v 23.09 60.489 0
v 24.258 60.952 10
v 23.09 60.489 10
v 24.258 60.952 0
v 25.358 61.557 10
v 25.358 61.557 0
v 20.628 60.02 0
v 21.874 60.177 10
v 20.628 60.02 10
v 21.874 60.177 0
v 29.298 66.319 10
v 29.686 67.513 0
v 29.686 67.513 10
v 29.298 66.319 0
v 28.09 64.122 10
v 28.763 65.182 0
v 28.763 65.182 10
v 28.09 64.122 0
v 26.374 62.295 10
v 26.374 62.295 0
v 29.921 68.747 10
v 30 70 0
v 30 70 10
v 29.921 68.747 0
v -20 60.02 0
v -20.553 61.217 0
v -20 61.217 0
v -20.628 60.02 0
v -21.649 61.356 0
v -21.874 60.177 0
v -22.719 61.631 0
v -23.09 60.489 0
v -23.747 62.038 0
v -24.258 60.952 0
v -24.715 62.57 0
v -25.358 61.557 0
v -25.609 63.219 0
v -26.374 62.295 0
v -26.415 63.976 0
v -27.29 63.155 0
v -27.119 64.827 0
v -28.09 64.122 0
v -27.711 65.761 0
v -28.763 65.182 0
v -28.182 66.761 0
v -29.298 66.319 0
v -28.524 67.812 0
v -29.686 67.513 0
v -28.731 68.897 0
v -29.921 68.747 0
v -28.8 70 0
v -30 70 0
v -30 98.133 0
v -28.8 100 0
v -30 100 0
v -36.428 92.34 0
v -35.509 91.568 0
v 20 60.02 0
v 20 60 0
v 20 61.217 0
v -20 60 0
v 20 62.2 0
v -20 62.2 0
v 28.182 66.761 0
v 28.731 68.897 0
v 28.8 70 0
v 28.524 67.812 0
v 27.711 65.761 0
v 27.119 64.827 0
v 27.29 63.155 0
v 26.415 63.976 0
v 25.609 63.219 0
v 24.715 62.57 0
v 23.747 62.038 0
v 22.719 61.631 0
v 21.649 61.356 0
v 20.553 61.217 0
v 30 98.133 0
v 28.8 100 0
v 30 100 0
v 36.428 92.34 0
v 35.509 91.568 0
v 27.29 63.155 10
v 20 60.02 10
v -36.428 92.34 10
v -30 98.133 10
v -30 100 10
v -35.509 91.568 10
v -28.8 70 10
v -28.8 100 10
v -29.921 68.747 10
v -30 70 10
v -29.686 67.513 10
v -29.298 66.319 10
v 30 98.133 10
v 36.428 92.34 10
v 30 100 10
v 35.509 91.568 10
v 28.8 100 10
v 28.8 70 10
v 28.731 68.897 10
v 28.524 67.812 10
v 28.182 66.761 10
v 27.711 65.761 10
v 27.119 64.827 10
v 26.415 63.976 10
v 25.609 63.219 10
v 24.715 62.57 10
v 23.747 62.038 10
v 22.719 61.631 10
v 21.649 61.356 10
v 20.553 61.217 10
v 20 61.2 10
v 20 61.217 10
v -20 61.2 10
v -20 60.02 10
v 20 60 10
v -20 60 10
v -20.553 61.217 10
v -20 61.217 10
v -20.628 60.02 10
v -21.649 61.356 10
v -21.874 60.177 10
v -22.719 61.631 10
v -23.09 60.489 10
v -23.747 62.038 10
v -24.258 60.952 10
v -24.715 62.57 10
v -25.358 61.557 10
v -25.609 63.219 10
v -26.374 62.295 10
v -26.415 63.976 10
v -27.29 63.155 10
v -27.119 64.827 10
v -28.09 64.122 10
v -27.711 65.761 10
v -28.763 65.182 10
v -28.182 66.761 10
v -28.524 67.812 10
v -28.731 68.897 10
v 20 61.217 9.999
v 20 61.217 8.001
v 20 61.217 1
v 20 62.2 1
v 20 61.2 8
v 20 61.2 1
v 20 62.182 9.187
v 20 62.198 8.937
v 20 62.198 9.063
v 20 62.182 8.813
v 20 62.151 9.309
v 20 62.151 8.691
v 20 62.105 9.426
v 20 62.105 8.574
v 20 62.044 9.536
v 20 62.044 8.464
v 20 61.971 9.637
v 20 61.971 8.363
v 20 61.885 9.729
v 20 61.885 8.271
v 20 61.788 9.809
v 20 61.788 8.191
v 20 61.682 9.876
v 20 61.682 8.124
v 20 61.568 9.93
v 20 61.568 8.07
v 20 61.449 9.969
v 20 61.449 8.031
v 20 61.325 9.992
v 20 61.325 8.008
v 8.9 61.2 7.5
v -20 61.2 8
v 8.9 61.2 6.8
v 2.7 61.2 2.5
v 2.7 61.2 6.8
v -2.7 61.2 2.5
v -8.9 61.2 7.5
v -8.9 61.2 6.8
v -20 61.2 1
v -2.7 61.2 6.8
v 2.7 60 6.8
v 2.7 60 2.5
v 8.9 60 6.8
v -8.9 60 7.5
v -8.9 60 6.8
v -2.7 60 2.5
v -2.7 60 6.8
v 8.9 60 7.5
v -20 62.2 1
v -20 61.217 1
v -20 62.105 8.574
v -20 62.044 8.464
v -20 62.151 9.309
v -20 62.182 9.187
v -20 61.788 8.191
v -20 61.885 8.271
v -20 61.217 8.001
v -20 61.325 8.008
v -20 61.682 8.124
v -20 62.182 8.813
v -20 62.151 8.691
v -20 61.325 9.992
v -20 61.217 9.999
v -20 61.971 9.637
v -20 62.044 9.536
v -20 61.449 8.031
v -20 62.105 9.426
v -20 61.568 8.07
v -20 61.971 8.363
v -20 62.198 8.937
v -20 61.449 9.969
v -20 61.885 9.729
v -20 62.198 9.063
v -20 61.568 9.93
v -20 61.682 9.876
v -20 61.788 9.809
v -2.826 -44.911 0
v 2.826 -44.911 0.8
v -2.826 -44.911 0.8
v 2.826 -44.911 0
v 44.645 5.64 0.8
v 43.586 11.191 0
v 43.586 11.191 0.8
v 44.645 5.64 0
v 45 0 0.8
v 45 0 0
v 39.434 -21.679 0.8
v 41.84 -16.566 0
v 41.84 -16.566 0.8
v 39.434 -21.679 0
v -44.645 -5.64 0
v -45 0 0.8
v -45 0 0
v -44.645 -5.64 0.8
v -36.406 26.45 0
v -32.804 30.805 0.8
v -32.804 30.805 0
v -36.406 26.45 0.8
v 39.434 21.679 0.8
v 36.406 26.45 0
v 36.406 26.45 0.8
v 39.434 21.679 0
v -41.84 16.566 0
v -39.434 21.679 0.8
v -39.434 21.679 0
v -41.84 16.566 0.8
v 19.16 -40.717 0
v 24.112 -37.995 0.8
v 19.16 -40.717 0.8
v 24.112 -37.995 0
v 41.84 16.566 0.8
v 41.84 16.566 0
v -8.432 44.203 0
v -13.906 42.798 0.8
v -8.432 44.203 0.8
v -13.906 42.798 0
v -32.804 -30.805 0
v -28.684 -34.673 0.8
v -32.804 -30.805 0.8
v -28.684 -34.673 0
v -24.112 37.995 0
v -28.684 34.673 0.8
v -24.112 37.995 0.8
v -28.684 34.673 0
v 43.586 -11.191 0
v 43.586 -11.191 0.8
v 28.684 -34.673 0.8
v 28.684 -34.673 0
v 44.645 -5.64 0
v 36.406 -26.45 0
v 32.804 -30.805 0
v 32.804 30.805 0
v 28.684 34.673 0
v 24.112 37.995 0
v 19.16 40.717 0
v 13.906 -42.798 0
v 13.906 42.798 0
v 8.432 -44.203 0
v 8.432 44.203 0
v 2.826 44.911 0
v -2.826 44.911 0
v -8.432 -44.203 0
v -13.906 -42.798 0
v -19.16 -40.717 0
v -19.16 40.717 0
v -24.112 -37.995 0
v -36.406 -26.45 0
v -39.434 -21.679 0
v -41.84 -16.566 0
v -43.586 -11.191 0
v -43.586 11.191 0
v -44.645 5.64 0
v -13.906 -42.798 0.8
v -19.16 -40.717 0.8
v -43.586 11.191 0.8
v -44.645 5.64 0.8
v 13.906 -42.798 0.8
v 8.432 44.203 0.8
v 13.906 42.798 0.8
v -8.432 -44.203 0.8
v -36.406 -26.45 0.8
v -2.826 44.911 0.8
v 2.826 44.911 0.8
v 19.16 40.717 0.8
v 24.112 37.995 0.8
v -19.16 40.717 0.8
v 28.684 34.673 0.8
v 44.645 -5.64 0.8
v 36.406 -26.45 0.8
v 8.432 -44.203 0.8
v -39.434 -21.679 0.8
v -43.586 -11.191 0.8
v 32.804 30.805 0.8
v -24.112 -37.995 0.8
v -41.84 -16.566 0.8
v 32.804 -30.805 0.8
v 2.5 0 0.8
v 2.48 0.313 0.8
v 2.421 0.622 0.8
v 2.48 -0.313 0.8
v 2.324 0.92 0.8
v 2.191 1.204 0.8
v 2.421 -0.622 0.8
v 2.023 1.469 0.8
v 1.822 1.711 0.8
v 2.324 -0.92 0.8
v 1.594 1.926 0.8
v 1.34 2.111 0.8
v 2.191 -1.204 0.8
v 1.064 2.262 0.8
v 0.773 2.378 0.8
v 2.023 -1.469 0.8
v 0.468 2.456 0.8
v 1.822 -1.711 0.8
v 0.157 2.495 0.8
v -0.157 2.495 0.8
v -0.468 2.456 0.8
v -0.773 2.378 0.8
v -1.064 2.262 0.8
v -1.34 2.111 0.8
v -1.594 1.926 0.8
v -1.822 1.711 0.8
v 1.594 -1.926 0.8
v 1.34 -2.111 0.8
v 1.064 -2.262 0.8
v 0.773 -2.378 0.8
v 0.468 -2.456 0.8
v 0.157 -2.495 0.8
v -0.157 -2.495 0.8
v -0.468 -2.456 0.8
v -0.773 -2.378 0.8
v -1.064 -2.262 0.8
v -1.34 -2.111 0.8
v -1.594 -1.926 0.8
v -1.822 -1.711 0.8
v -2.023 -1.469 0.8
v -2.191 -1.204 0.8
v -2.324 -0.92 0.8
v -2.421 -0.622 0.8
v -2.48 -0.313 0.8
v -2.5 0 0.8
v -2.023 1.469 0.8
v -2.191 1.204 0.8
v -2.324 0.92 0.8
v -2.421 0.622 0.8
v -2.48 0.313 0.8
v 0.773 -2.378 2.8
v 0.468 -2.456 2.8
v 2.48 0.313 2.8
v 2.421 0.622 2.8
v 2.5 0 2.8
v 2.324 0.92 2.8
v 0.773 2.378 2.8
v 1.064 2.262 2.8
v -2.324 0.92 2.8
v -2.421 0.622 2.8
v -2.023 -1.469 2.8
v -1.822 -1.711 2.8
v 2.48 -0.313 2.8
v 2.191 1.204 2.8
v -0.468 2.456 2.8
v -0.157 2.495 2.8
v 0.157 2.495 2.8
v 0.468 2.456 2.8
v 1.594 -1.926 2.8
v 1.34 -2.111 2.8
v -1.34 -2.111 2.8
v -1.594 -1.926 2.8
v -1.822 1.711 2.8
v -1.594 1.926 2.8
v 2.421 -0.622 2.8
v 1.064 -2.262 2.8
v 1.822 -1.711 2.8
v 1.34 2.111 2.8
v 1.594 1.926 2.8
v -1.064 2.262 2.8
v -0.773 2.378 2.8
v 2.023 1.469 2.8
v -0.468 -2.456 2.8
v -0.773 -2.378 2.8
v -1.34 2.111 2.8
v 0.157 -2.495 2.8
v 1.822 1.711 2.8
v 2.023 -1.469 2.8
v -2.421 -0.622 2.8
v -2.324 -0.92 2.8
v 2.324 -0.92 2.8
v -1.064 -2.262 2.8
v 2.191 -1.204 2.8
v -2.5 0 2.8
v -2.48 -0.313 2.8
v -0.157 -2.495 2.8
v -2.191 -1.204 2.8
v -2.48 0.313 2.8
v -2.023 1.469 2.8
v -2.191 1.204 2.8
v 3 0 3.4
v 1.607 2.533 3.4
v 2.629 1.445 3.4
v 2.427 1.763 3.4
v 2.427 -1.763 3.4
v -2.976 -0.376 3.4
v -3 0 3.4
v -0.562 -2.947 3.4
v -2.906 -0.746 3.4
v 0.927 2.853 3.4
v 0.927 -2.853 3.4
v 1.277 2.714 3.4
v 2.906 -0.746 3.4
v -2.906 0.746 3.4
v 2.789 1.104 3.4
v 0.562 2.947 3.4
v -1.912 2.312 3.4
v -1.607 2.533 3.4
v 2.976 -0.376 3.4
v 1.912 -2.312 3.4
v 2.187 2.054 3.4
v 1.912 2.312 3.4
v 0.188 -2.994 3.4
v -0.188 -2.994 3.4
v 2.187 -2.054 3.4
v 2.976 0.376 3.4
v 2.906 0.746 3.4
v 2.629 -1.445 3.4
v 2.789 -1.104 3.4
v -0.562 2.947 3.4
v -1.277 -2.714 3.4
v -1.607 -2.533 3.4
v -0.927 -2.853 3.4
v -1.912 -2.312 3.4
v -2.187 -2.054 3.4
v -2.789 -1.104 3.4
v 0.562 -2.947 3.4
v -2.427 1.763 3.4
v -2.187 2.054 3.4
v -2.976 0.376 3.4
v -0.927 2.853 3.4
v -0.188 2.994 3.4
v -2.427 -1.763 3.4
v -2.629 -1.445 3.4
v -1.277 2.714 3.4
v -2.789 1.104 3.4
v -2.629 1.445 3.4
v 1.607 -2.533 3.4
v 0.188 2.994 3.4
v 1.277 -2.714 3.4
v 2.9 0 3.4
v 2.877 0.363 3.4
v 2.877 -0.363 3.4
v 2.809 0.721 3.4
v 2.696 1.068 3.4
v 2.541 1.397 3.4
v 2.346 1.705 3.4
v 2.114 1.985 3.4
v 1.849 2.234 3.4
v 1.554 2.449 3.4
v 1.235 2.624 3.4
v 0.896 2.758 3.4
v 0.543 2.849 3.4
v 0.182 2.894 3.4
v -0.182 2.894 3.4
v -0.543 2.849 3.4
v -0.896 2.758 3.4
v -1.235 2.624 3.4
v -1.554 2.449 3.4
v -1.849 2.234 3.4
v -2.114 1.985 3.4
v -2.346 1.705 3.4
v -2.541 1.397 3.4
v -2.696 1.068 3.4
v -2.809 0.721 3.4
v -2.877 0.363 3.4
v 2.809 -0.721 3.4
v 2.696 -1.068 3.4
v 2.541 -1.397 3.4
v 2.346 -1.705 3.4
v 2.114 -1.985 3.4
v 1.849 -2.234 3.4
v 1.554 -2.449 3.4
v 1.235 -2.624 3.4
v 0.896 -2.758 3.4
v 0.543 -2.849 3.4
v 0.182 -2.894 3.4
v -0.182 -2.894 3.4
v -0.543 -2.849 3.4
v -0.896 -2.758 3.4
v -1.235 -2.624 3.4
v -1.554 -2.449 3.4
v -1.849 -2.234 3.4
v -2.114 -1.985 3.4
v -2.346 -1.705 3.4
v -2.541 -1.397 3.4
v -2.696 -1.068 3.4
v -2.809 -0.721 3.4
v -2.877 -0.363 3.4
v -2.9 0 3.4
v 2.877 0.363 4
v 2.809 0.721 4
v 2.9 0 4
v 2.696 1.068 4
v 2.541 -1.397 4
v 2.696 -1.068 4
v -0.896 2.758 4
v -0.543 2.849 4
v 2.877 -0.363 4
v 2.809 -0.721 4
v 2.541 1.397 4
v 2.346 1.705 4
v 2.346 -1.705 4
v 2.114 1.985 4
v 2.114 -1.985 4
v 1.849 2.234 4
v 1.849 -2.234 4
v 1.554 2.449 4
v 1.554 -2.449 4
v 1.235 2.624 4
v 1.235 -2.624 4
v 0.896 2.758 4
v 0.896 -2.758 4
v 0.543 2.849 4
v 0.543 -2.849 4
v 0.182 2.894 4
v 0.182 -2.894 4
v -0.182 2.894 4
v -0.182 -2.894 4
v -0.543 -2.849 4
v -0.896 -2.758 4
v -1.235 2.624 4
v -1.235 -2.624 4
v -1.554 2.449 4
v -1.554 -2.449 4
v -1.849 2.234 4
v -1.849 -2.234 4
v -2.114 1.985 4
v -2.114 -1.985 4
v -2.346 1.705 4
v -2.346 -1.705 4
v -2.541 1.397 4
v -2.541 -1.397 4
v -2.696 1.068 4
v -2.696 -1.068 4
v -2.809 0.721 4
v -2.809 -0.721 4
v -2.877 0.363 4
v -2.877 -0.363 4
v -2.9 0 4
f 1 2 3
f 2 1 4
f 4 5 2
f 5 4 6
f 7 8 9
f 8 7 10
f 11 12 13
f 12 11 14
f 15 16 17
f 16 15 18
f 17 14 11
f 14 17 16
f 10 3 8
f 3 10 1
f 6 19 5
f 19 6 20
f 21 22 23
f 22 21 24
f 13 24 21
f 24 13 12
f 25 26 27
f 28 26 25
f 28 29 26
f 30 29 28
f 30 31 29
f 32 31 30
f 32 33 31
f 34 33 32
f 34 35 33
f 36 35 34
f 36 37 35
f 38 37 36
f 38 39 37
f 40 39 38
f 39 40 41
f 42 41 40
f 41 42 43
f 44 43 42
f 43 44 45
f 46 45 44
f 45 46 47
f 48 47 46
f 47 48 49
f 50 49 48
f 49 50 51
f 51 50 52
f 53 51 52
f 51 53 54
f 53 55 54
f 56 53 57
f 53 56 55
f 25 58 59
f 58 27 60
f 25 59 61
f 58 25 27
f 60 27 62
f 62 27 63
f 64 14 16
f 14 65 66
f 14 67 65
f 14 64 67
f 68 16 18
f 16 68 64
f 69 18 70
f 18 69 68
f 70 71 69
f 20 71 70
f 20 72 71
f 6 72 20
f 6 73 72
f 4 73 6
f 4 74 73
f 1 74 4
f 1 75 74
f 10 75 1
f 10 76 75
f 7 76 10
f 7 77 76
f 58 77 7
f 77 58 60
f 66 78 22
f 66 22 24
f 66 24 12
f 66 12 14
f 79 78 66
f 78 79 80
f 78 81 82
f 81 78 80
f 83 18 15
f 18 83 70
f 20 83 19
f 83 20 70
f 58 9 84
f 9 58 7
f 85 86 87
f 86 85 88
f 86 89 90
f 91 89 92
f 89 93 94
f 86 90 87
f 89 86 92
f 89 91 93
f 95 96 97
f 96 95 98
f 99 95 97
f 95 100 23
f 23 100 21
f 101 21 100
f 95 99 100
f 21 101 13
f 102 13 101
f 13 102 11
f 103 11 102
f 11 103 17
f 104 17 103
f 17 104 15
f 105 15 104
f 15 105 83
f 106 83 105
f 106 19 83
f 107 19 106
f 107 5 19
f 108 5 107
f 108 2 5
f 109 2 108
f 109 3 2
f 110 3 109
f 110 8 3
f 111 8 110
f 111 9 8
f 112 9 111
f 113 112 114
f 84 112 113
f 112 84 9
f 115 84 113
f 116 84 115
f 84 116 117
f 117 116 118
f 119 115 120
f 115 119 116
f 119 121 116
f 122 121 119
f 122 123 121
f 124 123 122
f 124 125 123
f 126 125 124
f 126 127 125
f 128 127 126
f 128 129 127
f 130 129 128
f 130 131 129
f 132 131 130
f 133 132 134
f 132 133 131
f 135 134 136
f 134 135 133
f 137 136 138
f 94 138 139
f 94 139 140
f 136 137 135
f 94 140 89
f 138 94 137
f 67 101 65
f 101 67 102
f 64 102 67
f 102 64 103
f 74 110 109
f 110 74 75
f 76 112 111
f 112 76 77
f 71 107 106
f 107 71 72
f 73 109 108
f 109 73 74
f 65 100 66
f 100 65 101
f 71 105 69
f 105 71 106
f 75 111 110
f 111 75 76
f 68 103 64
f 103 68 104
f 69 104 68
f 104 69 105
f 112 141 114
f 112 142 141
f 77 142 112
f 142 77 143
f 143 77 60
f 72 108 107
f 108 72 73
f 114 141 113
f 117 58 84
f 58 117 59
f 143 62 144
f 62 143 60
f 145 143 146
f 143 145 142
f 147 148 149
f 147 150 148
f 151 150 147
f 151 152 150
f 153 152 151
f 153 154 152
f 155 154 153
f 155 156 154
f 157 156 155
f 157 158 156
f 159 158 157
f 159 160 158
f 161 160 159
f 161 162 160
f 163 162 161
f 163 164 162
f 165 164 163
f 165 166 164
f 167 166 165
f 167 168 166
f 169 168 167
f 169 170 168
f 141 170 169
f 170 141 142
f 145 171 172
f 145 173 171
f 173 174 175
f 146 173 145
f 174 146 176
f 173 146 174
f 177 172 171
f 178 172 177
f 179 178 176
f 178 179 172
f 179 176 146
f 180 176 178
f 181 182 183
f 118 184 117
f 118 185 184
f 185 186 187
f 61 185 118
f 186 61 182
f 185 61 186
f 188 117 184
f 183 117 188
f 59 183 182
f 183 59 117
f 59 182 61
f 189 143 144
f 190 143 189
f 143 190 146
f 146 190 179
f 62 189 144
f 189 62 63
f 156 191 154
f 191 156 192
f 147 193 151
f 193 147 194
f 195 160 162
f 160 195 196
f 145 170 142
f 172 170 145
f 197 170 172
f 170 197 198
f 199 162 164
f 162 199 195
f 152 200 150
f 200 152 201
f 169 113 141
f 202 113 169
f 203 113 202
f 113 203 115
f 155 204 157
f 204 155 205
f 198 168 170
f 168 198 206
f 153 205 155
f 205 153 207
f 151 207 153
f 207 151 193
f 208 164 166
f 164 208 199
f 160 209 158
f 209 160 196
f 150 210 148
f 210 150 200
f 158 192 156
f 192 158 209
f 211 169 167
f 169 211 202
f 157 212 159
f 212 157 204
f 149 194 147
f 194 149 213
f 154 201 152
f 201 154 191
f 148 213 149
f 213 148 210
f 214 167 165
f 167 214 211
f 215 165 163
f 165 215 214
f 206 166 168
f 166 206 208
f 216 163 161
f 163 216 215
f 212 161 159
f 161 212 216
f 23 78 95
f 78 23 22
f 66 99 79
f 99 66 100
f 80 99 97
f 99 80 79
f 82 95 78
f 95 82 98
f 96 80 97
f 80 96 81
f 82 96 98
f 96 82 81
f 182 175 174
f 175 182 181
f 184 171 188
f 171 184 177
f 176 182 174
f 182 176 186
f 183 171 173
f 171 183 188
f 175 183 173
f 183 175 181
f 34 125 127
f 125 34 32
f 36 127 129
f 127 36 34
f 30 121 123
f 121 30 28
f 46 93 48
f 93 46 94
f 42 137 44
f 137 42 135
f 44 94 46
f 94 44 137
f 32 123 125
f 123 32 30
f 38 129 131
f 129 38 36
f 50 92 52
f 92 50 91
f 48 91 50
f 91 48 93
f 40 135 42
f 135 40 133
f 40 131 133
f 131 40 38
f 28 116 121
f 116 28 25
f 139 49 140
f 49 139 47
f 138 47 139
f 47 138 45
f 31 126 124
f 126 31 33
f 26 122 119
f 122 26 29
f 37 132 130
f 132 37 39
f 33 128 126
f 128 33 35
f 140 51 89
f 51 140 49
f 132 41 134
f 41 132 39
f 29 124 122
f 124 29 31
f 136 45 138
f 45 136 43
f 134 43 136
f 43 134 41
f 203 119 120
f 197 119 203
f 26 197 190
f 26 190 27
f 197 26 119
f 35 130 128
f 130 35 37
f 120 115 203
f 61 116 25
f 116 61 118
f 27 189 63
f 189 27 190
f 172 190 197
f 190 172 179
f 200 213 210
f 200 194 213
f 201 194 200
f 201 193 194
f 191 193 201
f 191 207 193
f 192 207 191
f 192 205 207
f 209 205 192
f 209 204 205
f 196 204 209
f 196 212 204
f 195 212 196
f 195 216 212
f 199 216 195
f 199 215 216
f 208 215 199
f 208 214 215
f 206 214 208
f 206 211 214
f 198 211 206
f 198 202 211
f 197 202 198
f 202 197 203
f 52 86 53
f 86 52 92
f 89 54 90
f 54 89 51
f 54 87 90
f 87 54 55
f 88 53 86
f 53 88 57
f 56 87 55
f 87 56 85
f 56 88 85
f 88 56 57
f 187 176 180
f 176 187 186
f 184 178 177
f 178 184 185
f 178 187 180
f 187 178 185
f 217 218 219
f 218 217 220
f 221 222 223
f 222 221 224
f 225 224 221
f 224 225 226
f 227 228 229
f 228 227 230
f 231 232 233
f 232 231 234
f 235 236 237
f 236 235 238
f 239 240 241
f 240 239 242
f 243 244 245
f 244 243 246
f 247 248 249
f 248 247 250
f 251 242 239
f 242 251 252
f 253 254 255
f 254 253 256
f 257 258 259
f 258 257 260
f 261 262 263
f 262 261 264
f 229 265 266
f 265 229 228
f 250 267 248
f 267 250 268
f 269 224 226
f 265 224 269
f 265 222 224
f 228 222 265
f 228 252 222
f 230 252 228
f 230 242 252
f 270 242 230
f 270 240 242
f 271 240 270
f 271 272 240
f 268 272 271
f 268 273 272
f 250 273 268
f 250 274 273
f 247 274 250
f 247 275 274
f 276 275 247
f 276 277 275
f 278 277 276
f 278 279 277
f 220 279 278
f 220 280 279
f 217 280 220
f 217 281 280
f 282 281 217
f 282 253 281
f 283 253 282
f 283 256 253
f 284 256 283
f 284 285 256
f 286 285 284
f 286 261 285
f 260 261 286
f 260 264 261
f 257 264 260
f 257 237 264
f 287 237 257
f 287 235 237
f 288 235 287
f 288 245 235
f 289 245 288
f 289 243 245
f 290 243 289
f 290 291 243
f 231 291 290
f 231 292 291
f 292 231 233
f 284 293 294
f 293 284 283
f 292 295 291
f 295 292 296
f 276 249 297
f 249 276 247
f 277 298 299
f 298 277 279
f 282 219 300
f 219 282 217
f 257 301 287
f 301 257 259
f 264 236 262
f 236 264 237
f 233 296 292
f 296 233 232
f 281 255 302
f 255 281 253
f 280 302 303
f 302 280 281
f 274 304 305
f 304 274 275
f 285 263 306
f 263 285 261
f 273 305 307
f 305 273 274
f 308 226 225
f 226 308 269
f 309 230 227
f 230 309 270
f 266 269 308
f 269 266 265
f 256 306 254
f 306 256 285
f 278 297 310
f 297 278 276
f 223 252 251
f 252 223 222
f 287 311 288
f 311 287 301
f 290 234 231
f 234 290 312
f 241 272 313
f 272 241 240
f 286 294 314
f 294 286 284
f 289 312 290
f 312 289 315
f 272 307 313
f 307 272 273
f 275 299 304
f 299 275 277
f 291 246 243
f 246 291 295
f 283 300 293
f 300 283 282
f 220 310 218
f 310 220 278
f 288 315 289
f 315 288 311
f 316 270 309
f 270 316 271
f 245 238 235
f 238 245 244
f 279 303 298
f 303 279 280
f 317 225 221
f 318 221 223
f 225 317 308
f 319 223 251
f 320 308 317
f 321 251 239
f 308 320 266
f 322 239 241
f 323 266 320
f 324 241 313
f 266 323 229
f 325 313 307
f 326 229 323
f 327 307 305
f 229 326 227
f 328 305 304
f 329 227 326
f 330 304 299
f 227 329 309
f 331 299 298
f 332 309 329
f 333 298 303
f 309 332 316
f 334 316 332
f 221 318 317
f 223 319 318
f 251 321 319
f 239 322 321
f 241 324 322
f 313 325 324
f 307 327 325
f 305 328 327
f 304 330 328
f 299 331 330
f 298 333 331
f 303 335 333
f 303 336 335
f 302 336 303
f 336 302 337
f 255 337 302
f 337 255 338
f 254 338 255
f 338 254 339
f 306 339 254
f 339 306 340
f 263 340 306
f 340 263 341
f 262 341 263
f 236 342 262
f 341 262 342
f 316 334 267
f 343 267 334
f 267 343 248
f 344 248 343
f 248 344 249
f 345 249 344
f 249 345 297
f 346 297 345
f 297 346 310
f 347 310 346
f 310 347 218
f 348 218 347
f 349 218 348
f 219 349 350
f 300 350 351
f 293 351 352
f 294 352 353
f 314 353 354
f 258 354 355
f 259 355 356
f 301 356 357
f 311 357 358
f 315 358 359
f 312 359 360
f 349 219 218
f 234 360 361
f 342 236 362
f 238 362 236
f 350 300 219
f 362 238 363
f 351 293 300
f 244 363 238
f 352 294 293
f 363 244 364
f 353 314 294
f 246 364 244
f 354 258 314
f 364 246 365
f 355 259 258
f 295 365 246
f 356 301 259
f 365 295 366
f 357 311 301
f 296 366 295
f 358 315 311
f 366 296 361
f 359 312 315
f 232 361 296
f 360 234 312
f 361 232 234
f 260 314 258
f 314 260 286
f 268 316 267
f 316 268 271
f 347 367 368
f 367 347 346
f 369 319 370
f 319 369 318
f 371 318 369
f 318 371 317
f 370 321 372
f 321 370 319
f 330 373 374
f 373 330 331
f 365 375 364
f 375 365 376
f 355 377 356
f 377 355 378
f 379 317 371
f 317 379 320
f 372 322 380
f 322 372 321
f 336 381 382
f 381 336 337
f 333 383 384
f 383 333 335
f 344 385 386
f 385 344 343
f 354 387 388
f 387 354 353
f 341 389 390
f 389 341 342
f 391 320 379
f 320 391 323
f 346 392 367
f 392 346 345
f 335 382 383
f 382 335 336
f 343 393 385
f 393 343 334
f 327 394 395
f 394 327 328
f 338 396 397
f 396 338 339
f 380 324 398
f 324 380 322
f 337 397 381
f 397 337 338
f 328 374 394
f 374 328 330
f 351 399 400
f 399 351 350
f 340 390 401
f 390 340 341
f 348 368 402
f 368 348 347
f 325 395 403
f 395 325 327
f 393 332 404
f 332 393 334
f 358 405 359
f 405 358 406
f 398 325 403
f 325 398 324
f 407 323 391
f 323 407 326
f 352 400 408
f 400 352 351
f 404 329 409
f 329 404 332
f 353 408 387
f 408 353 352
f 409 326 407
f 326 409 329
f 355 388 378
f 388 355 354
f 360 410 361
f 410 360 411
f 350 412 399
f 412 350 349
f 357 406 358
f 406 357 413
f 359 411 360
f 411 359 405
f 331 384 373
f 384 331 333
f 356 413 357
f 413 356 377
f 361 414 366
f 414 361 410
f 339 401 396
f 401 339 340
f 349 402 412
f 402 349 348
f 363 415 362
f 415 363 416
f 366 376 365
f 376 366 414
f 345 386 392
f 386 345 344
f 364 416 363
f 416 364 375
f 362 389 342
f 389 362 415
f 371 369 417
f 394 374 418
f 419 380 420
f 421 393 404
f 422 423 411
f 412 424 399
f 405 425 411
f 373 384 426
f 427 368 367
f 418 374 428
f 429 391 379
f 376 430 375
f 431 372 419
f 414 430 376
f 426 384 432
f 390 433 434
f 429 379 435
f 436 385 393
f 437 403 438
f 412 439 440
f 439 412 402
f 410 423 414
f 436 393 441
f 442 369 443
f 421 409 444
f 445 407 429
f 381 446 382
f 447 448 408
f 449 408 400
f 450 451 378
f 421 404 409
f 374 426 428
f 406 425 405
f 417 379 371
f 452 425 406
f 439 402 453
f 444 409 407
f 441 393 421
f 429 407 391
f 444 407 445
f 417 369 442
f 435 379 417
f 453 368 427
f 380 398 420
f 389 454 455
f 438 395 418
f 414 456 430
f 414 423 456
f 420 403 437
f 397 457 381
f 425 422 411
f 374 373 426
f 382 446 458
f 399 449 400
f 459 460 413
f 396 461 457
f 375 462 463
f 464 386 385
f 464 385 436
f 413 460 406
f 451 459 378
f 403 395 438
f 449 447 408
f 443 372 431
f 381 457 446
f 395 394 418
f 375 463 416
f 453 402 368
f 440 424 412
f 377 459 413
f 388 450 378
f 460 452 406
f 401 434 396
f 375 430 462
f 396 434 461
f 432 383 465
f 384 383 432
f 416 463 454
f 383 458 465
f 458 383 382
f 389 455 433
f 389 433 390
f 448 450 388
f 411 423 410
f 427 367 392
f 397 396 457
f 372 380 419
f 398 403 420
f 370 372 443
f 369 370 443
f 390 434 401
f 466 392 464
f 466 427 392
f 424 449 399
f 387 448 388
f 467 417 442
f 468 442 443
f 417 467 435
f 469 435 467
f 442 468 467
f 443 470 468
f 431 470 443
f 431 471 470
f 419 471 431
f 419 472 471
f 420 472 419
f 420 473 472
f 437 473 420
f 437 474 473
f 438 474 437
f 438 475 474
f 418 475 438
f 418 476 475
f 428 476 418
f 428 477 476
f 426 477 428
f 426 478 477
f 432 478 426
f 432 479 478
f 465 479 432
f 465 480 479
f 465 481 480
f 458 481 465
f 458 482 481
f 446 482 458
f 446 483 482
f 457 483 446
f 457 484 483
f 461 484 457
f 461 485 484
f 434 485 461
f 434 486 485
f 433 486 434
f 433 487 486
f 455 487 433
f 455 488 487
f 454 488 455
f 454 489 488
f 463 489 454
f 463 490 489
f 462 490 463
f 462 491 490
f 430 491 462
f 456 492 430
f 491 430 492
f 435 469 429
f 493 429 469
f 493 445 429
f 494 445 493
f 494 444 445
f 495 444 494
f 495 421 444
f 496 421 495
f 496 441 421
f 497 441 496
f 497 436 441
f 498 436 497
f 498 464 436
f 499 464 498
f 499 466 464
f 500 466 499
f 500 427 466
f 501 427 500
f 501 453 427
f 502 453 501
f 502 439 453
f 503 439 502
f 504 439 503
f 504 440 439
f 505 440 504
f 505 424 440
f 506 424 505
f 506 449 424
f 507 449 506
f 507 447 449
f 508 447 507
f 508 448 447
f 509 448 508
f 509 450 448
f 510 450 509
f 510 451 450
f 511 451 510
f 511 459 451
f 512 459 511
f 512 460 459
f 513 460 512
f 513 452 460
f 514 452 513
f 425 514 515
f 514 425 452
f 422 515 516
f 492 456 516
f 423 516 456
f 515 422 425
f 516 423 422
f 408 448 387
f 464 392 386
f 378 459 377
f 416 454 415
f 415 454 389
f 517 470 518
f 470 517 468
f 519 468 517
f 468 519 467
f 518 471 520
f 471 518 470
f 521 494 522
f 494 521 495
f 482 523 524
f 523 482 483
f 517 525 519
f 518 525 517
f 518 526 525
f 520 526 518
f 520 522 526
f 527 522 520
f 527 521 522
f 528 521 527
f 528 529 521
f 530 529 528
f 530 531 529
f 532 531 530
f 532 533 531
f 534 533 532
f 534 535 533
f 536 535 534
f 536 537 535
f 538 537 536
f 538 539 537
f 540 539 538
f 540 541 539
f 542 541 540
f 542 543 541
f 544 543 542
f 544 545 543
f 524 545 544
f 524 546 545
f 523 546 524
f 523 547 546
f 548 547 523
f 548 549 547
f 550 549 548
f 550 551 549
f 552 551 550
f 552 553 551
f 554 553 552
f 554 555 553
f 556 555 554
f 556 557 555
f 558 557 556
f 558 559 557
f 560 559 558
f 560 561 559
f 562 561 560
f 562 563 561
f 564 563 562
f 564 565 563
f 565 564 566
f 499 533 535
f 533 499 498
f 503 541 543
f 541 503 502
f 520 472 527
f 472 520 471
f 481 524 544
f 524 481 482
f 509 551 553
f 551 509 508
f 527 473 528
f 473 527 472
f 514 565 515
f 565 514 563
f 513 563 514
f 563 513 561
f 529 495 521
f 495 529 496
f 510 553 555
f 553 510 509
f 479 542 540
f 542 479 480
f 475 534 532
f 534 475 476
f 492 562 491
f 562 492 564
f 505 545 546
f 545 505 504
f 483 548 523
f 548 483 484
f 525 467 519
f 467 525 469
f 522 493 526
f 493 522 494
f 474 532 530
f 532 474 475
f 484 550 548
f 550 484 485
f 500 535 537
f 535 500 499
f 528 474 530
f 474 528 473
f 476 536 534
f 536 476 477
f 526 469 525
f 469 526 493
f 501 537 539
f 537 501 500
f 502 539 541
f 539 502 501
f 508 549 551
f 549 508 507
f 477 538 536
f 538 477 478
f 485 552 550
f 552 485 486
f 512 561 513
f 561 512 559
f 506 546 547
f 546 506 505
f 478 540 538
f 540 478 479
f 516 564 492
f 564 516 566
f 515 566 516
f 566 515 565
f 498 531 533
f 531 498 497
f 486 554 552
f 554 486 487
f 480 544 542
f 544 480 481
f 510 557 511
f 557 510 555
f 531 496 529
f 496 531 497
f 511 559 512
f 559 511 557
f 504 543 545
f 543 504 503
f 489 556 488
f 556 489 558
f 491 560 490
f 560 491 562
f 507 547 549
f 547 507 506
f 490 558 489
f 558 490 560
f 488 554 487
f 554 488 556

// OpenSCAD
$fn=50;

DM=60; //Durchmesser Verteilerdose
radius=10; //"Biegeradius" der Klammer
laschenlaenge=30; //Laenge der Laschen
laschendicke=1.2; //Dicke der Laschen

translate([0,0,0])cylinder(r=DM/2+15,h=0.8);
translate([0,0,0])cylinder(r=2.5,h=2.8);
translate([0,0,2.8])cylinder(r1=2.5,r2=3,h=0.6);
translate([0,0,3.4])cylinder(r1=2.9,r2=2.9,h=0.6);

translate([0,DM,0]){
  klammerseite();
  mirror()klammerseite();
}
  
module klammerseite(){
  difference(){
    union(){
      translate([0,0,0])cube([DM/2-radius,laschendicke,10]);
      translate([0,laschendicke,0])cube([DM/2-radius,1,1]);
      translate([0,laschendicke,10-1])rotate([0,90,0])cylinder(r=laschendicke-0.2,h=DM/2-radius);
        difference(){
          translate([DM/2-radius,radius,0])cylinder(r=radius,h=10);
          translate([DM/2-radius,radius,-0.1])cylinder(r=radius-laschendicke,h=10.2);
          translate([DM/2-2*radius,laschendicke,-0.1])cube([radius,radius*2,10.2]);
          translate([DM/2-radius-0.1,radius,-0.1])cube([radius+2,radius+2,10.2]);
        }
        translate([DM/2-laschendicke,radius,0])cube([laschendicke,laschenlaenge,10]);
        translate([DM/2,radius+laschenlaenge,0])rotate([0,0,-140])cube([laschendicke,10,10]);
    }
    translate([-0.1,-0.1,2.5])cube([2.8,laschendicke+0.2,5]);
    translate([-0.1,-0.1,6.8])cube([9,laschendicke+0.2,0.7]);
  }
}
